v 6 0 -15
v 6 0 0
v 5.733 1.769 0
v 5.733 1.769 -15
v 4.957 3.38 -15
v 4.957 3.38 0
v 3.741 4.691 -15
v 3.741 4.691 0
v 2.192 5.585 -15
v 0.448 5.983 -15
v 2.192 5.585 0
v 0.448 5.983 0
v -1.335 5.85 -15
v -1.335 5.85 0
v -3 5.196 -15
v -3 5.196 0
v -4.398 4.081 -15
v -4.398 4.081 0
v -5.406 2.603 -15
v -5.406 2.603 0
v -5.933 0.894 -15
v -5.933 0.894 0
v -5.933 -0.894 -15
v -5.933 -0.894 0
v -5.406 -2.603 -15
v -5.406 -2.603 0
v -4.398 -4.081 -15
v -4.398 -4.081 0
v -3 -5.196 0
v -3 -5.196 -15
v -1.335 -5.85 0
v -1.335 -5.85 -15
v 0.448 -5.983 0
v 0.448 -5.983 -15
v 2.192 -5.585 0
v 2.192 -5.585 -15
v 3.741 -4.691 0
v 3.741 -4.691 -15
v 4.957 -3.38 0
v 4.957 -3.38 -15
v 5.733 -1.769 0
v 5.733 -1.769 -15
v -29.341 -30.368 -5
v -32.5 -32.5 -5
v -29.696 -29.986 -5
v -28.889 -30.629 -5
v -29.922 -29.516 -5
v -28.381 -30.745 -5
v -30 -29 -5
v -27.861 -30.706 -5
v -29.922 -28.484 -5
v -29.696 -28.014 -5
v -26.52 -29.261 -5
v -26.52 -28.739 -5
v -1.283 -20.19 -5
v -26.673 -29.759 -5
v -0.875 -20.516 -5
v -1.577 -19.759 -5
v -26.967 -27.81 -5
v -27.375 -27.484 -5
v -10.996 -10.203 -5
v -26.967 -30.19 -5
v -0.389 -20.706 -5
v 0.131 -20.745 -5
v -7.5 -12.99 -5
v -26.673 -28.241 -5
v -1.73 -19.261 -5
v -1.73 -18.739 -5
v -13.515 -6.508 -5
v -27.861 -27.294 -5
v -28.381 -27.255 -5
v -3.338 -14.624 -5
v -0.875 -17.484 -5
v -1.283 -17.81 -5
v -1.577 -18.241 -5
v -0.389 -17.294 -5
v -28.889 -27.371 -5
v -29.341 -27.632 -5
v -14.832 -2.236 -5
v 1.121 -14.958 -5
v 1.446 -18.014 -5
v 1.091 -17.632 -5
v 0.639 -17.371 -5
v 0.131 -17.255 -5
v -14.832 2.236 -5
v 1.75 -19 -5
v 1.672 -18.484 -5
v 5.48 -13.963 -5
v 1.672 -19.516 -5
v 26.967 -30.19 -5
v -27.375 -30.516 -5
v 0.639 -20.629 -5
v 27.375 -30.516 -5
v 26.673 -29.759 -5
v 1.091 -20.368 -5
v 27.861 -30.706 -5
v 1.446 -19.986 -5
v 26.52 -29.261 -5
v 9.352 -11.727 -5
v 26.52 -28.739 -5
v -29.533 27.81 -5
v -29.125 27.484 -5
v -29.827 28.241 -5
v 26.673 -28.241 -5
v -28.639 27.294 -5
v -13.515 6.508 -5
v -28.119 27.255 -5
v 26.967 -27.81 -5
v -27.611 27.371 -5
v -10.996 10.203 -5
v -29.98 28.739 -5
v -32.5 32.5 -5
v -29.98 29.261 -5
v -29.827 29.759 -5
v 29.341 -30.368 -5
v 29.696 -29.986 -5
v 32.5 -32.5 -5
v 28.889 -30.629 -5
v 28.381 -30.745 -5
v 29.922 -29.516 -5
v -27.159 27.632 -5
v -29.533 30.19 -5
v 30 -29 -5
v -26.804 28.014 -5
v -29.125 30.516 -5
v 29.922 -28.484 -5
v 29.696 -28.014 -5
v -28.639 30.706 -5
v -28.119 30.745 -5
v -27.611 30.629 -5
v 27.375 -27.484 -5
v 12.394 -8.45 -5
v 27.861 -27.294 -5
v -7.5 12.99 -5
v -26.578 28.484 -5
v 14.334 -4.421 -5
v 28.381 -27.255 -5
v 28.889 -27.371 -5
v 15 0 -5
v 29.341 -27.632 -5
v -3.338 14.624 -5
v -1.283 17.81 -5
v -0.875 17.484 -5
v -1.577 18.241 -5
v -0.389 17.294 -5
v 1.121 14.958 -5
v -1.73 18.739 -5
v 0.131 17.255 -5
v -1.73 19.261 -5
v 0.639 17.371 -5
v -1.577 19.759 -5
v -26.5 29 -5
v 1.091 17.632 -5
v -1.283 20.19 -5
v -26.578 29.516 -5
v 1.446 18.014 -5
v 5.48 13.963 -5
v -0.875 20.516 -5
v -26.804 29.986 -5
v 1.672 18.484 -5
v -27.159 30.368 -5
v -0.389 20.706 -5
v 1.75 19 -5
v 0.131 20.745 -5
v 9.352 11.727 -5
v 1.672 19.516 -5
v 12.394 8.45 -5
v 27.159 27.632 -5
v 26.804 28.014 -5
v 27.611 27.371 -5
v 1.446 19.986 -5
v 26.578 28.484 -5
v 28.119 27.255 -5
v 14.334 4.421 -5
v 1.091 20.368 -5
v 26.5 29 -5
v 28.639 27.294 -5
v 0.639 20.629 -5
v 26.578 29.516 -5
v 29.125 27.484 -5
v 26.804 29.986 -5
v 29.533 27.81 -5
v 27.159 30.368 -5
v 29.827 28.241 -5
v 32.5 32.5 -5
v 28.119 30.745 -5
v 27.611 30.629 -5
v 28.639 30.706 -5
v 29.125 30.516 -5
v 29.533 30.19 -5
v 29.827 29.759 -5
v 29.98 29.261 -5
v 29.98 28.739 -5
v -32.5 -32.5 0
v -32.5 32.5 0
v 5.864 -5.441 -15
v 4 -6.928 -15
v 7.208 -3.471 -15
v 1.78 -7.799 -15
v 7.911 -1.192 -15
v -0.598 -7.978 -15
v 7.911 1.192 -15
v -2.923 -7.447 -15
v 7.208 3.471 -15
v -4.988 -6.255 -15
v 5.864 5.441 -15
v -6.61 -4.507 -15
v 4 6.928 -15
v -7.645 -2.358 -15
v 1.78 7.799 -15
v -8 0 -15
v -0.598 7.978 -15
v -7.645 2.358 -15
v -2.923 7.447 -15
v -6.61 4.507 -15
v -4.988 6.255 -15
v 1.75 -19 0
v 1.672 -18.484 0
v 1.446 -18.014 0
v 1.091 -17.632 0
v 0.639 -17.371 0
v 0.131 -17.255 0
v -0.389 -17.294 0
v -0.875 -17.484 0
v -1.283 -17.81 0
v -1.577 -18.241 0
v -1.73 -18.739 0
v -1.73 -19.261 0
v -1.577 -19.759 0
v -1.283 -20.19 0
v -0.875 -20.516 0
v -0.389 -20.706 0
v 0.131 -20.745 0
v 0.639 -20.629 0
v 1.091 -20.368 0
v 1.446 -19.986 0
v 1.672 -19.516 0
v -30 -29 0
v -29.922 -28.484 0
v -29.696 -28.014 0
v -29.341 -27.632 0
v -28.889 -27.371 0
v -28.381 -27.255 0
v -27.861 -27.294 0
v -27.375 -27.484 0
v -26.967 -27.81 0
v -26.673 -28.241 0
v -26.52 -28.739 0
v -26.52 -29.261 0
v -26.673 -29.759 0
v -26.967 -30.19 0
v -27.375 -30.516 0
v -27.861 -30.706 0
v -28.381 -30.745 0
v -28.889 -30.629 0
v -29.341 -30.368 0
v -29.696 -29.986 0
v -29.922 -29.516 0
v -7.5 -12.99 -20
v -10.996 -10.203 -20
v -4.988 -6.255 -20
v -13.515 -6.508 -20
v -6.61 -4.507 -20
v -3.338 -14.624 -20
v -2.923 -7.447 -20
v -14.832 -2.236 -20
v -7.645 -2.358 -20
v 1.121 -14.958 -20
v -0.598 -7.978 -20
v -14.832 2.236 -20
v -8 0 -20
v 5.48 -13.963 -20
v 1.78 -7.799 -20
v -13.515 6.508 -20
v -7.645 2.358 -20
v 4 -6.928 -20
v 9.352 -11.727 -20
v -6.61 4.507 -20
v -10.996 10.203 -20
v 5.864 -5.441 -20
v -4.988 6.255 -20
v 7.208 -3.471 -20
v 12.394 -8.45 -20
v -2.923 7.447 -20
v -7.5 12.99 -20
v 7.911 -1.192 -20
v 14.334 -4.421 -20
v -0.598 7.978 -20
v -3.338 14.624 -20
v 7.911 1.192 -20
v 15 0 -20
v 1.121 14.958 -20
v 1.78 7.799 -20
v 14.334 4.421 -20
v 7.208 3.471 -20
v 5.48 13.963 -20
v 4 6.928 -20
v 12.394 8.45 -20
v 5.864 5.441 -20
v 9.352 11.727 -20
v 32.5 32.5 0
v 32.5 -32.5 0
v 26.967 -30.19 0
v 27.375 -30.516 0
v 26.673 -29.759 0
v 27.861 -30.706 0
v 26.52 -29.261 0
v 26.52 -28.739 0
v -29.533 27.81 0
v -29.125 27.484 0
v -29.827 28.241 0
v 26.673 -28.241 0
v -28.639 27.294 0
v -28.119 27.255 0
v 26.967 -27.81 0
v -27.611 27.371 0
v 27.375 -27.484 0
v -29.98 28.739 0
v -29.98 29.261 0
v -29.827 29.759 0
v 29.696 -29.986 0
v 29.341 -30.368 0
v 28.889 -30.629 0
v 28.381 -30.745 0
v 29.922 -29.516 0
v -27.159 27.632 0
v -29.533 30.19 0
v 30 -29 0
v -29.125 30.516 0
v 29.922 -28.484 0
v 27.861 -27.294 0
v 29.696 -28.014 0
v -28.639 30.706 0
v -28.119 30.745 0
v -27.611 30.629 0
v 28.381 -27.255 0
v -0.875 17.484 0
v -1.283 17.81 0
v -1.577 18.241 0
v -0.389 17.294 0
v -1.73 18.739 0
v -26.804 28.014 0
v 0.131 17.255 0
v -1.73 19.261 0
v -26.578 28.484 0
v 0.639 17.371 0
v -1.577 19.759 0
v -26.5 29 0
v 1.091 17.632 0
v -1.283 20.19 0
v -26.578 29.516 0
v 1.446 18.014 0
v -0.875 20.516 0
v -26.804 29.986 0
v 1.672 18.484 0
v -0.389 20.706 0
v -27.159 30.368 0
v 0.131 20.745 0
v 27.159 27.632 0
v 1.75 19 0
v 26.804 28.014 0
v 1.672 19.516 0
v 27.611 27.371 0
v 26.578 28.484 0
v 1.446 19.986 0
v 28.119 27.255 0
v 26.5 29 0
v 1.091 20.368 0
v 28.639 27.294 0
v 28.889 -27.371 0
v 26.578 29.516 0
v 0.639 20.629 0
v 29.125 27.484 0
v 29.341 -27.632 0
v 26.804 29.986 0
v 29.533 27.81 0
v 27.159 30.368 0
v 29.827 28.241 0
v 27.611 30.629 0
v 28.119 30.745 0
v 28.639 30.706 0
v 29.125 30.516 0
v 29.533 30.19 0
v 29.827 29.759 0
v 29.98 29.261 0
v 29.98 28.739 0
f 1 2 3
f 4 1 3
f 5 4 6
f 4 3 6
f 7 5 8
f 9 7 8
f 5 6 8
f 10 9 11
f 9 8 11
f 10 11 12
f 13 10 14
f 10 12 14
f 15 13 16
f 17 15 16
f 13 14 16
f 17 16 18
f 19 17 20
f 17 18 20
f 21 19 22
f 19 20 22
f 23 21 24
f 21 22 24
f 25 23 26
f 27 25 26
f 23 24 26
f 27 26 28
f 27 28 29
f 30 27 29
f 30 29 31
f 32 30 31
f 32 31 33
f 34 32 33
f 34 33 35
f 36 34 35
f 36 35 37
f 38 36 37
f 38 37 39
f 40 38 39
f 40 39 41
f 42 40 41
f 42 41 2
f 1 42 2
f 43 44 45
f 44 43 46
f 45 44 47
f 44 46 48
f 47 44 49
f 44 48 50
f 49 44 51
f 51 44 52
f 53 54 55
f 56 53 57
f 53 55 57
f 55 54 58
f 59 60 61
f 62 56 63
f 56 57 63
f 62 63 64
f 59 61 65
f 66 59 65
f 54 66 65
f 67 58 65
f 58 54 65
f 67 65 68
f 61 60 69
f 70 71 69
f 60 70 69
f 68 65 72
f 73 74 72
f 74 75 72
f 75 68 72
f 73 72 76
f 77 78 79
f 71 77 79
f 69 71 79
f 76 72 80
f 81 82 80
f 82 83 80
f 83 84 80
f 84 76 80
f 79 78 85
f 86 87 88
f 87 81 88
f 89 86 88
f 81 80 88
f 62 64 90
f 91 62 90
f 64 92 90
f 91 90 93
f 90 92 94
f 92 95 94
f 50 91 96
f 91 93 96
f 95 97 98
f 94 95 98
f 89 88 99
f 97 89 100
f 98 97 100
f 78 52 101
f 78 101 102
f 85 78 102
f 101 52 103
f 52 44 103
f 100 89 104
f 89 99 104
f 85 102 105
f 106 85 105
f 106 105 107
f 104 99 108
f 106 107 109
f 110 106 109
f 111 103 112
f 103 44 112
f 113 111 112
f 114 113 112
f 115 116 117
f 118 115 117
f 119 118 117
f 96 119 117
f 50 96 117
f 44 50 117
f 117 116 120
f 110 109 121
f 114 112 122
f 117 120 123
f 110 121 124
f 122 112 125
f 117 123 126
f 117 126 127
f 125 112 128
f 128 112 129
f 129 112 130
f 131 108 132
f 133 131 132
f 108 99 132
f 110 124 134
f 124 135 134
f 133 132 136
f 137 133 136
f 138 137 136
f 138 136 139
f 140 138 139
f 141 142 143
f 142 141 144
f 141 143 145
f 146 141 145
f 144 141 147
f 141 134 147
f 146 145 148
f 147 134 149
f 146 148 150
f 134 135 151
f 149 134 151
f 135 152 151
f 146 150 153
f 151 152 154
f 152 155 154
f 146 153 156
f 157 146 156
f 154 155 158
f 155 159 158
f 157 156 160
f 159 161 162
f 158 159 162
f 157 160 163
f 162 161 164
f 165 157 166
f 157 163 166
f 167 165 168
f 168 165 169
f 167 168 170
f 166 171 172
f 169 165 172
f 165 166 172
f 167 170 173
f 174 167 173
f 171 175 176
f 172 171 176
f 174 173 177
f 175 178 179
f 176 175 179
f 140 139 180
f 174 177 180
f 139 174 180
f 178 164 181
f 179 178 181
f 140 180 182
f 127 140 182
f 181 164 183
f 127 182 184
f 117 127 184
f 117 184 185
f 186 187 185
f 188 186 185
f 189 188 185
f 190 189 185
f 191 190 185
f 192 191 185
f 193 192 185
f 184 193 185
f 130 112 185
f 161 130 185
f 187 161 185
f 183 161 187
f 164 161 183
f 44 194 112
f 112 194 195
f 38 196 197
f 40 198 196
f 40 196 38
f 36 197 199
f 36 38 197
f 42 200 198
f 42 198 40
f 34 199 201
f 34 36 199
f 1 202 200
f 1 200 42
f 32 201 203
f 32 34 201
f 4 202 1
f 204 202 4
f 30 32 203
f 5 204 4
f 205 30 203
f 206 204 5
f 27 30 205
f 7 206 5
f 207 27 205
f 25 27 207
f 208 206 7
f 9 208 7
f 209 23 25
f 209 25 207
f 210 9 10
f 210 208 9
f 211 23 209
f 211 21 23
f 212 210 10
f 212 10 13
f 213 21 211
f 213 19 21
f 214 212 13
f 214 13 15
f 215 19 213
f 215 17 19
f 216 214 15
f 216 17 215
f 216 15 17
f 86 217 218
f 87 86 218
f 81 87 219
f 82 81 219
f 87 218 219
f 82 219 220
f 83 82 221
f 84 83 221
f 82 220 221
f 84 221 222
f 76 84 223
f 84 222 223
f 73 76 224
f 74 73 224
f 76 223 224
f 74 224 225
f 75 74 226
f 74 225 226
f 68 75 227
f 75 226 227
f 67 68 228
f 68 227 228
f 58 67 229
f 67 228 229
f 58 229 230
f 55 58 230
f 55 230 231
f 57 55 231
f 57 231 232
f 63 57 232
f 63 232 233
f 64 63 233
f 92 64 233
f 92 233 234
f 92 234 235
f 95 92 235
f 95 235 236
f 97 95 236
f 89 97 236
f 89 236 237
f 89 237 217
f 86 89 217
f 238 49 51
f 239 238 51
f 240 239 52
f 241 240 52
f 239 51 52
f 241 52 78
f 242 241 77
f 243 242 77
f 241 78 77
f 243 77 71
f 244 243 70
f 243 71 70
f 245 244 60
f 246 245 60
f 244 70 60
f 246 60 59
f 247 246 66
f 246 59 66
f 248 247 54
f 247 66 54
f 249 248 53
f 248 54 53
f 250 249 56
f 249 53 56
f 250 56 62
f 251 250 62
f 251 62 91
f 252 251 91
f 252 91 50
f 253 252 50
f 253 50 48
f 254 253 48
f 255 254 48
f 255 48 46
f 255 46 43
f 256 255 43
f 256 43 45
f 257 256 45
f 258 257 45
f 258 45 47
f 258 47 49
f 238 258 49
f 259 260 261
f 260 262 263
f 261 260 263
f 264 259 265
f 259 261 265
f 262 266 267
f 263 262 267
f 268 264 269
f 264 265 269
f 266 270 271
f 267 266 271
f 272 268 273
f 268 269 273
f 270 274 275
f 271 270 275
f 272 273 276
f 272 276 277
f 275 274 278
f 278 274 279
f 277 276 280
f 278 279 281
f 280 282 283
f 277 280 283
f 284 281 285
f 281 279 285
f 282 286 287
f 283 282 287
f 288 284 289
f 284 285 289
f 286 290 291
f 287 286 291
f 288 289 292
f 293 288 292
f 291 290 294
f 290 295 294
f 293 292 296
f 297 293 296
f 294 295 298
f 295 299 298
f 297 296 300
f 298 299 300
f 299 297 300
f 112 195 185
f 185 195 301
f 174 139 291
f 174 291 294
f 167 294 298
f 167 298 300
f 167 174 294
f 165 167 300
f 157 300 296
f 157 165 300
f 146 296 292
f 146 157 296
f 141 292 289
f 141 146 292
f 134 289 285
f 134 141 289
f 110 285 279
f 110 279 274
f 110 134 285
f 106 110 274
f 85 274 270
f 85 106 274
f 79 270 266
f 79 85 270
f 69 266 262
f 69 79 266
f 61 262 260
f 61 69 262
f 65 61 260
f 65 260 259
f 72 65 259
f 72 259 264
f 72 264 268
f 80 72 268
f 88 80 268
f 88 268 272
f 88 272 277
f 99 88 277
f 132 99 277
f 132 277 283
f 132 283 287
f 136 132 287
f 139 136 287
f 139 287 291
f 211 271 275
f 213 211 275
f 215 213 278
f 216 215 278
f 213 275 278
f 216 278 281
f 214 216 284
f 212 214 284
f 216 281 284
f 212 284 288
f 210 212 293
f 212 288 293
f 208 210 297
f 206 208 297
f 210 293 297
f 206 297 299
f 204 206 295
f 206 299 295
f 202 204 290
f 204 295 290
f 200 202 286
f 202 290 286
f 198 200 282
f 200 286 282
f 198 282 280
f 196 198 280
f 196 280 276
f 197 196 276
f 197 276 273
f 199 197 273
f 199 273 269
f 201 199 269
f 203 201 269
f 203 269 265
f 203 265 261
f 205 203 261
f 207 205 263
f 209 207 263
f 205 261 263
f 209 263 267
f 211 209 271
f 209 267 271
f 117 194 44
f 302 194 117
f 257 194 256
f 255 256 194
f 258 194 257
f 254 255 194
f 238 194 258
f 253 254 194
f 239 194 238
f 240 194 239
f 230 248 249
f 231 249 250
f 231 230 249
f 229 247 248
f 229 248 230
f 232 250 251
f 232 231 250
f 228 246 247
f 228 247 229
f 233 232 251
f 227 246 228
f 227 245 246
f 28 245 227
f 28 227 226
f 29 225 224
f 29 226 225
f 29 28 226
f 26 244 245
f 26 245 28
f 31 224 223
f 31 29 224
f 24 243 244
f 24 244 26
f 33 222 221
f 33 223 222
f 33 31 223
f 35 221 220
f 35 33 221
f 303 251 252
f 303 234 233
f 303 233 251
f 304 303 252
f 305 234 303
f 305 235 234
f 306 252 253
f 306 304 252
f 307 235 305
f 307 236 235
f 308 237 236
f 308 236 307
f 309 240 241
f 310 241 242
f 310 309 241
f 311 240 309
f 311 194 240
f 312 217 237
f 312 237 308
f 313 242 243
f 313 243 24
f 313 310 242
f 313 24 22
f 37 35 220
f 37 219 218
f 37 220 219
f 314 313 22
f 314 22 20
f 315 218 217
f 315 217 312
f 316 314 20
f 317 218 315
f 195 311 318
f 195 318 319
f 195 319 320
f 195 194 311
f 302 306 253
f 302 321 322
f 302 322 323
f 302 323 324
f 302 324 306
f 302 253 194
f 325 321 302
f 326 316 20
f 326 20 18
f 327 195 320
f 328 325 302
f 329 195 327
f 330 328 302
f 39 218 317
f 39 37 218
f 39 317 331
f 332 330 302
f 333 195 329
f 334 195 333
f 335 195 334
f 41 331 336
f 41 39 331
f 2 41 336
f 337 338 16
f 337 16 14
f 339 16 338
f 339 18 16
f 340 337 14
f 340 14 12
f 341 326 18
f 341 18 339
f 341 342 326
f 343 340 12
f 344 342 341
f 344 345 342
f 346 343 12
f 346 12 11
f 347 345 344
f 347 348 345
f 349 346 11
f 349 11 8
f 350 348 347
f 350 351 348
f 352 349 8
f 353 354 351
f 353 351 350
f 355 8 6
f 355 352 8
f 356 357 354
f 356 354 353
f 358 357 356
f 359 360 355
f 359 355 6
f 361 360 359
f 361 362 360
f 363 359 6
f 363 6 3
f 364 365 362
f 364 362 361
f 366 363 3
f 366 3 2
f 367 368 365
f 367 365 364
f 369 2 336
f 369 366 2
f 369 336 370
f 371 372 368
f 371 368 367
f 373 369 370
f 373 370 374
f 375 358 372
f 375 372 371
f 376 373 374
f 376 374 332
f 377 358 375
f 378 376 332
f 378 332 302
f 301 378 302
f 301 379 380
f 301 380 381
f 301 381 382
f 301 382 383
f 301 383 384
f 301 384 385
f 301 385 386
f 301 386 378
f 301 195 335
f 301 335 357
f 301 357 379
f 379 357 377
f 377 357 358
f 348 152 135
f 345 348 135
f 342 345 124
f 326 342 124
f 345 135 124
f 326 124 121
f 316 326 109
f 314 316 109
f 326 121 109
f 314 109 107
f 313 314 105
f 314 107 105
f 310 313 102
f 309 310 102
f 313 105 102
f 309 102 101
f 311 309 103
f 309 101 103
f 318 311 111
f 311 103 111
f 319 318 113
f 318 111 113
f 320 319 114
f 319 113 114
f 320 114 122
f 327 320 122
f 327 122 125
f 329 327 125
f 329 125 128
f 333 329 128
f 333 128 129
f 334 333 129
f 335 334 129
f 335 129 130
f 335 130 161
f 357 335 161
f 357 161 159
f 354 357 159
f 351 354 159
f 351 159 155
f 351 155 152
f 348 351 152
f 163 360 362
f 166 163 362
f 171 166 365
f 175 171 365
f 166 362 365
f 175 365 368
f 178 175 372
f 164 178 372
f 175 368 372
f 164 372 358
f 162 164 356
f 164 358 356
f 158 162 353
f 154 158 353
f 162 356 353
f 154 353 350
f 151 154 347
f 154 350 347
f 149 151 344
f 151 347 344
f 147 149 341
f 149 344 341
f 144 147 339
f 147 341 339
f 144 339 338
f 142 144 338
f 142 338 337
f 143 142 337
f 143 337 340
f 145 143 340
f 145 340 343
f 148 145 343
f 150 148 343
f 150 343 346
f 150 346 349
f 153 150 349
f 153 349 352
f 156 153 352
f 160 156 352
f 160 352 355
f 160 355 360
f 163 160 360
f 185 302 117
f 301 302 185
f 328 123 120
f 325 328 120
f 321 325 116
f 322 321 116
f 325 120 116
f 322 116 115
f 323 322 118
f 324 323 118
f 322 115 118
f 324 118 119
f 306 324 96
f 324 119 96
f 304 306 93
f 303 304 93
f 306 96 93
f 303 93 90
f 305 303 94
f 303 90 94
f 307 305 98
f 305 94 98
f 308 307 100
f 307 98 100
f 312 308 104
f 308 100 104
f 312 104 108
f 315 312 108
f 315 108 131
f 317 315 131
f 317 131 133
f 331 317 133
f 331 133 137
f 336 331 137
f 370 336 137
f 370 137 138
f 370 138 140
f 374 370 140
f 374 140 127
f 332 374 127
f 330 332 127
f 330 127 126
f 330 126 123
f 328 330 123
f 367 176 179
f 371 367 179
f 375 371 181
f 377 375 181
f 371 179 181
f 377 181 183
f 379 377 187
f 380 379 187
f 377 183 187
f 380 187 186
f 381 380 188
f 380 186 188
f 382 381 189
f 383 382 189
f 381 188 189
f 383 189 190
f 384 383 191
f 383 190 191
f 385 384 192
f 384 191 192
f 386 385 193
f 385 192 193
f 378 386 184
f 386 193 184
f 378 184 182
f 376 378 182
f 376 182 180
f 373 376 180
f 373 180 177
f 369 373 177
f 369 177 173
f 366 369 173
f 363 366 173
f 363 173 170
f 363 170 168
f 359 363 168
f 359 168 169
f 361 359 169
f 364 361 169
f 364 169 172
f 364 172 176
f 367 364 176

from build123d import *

# Parameters (mm, degrees)
SKETCH1_R           = 15
BOSS_EXTRUDE1_DEPTH = 20
SKETCH2_R           = 8
CUT_EXTRUDE1_DEPTH  = 5
SKETCH4_W           = 65
SKETCH4_H           = 65
BOSS_EXTRUDE2_DEPTH = 5
SKETCH3_R           = 6
CUT_EXTRUDE2_DEPTH  = 51.124844139
SKETCH5_R           = 1.75
CUT_EXTRUDE3_DEPTH  = 49.347699015
SKETCH6_R           = 1.75
CUT_EXTRUDE4_DEPTH  = 51.124844139


with BuildPart() as part:
    # Sketch1 → Boss-Extrude1 (new body)
    with BuildSketch(Plane.XY):
        Circle(SKETCH1_R)
    extrude(amount=-BOSS_EXTRUDE1_DEPTH)

    # Sketch2 → Cut-Extrude1 (cut)
    with BuildSketch(Plane(origin=(0, 0, -20), x_dir=(-1, 0, 0), z_dir=(0, 0, -1))):
        Circle(SKETCH2_R)
    extrude(amount=-CUT_EXTRUDE1_DEPTH, mode=Mode.SUBTRACT)

    # Sketch4 → Boss-Extrude2 (add)
    with BuildSketch(Plane.XY):
        Rectangle(SKETCH4_W, SKETCH4_H)
    extrude(amount=-BOSS_EXTRUDE2_DEPTH)

    # Sketch3 → Cut-Extrude2 (cut, through all)
    with BuildSketch(Plane.XY):
        Circle(SKETCH3_R)
    extrude(amount=-CUT_EXTRUDE2_DEPTH, mode=Mode.SUBTRACT)

    # Sketch5 → Cut-Extrude3 (cut, through all)
    with BuildSketch(Plane(origin=(0, 0, -5), x_dir=(-1, 0, 0), z_dir=(0, 0, -1))):
        with Locations((-28.25, 29)):
            Circle(SKETCH5_R)
        with Locations(Location((28.25, 29, 0), (0, 0, 180))):
            Circle(SKETCH5_R)
        with Locations((28.25, -29)):
            Circle(SKETCH5_R)
        with Locations(Location((-28.25, -29, 0), (0, 0, 180))):
            Circle(SKETCH5_R)
    extrude(amount=-CUT_EXTRUDE3_DEPTH, mode=Mode.SUBTRACT)

    # Sketch6 → Cut-Extrude4 (cut, through all)
    with BuildSketch(Plane.XY):
        with Locations((0, 19)):
            Circle(SKETCH6_R)
        with Locations((0, -19)):
            Circle(SKETCH6_R)
    extrude(amount=-CUT_EXTRUDE4_DEPTH, mode=Mode.SUBTRACT)


solid = part.part
